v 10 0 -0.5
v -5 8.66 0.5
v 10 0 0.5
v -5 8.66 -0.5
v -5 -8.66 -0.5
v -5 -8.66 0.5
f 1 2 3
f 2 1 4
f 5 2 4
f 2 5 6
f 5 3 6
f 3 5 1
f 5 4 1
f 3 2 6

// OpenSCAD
    
module rotate_about_pt(a, v, pt){
    translate(pt)
        rotate(a, v)
            translate(-pt)
                children();
} 

rotate_about_pt($t*90, 0, [10, 0, 0])
cylinder(center = true, r=10, h=1, $fn=3); 
    
